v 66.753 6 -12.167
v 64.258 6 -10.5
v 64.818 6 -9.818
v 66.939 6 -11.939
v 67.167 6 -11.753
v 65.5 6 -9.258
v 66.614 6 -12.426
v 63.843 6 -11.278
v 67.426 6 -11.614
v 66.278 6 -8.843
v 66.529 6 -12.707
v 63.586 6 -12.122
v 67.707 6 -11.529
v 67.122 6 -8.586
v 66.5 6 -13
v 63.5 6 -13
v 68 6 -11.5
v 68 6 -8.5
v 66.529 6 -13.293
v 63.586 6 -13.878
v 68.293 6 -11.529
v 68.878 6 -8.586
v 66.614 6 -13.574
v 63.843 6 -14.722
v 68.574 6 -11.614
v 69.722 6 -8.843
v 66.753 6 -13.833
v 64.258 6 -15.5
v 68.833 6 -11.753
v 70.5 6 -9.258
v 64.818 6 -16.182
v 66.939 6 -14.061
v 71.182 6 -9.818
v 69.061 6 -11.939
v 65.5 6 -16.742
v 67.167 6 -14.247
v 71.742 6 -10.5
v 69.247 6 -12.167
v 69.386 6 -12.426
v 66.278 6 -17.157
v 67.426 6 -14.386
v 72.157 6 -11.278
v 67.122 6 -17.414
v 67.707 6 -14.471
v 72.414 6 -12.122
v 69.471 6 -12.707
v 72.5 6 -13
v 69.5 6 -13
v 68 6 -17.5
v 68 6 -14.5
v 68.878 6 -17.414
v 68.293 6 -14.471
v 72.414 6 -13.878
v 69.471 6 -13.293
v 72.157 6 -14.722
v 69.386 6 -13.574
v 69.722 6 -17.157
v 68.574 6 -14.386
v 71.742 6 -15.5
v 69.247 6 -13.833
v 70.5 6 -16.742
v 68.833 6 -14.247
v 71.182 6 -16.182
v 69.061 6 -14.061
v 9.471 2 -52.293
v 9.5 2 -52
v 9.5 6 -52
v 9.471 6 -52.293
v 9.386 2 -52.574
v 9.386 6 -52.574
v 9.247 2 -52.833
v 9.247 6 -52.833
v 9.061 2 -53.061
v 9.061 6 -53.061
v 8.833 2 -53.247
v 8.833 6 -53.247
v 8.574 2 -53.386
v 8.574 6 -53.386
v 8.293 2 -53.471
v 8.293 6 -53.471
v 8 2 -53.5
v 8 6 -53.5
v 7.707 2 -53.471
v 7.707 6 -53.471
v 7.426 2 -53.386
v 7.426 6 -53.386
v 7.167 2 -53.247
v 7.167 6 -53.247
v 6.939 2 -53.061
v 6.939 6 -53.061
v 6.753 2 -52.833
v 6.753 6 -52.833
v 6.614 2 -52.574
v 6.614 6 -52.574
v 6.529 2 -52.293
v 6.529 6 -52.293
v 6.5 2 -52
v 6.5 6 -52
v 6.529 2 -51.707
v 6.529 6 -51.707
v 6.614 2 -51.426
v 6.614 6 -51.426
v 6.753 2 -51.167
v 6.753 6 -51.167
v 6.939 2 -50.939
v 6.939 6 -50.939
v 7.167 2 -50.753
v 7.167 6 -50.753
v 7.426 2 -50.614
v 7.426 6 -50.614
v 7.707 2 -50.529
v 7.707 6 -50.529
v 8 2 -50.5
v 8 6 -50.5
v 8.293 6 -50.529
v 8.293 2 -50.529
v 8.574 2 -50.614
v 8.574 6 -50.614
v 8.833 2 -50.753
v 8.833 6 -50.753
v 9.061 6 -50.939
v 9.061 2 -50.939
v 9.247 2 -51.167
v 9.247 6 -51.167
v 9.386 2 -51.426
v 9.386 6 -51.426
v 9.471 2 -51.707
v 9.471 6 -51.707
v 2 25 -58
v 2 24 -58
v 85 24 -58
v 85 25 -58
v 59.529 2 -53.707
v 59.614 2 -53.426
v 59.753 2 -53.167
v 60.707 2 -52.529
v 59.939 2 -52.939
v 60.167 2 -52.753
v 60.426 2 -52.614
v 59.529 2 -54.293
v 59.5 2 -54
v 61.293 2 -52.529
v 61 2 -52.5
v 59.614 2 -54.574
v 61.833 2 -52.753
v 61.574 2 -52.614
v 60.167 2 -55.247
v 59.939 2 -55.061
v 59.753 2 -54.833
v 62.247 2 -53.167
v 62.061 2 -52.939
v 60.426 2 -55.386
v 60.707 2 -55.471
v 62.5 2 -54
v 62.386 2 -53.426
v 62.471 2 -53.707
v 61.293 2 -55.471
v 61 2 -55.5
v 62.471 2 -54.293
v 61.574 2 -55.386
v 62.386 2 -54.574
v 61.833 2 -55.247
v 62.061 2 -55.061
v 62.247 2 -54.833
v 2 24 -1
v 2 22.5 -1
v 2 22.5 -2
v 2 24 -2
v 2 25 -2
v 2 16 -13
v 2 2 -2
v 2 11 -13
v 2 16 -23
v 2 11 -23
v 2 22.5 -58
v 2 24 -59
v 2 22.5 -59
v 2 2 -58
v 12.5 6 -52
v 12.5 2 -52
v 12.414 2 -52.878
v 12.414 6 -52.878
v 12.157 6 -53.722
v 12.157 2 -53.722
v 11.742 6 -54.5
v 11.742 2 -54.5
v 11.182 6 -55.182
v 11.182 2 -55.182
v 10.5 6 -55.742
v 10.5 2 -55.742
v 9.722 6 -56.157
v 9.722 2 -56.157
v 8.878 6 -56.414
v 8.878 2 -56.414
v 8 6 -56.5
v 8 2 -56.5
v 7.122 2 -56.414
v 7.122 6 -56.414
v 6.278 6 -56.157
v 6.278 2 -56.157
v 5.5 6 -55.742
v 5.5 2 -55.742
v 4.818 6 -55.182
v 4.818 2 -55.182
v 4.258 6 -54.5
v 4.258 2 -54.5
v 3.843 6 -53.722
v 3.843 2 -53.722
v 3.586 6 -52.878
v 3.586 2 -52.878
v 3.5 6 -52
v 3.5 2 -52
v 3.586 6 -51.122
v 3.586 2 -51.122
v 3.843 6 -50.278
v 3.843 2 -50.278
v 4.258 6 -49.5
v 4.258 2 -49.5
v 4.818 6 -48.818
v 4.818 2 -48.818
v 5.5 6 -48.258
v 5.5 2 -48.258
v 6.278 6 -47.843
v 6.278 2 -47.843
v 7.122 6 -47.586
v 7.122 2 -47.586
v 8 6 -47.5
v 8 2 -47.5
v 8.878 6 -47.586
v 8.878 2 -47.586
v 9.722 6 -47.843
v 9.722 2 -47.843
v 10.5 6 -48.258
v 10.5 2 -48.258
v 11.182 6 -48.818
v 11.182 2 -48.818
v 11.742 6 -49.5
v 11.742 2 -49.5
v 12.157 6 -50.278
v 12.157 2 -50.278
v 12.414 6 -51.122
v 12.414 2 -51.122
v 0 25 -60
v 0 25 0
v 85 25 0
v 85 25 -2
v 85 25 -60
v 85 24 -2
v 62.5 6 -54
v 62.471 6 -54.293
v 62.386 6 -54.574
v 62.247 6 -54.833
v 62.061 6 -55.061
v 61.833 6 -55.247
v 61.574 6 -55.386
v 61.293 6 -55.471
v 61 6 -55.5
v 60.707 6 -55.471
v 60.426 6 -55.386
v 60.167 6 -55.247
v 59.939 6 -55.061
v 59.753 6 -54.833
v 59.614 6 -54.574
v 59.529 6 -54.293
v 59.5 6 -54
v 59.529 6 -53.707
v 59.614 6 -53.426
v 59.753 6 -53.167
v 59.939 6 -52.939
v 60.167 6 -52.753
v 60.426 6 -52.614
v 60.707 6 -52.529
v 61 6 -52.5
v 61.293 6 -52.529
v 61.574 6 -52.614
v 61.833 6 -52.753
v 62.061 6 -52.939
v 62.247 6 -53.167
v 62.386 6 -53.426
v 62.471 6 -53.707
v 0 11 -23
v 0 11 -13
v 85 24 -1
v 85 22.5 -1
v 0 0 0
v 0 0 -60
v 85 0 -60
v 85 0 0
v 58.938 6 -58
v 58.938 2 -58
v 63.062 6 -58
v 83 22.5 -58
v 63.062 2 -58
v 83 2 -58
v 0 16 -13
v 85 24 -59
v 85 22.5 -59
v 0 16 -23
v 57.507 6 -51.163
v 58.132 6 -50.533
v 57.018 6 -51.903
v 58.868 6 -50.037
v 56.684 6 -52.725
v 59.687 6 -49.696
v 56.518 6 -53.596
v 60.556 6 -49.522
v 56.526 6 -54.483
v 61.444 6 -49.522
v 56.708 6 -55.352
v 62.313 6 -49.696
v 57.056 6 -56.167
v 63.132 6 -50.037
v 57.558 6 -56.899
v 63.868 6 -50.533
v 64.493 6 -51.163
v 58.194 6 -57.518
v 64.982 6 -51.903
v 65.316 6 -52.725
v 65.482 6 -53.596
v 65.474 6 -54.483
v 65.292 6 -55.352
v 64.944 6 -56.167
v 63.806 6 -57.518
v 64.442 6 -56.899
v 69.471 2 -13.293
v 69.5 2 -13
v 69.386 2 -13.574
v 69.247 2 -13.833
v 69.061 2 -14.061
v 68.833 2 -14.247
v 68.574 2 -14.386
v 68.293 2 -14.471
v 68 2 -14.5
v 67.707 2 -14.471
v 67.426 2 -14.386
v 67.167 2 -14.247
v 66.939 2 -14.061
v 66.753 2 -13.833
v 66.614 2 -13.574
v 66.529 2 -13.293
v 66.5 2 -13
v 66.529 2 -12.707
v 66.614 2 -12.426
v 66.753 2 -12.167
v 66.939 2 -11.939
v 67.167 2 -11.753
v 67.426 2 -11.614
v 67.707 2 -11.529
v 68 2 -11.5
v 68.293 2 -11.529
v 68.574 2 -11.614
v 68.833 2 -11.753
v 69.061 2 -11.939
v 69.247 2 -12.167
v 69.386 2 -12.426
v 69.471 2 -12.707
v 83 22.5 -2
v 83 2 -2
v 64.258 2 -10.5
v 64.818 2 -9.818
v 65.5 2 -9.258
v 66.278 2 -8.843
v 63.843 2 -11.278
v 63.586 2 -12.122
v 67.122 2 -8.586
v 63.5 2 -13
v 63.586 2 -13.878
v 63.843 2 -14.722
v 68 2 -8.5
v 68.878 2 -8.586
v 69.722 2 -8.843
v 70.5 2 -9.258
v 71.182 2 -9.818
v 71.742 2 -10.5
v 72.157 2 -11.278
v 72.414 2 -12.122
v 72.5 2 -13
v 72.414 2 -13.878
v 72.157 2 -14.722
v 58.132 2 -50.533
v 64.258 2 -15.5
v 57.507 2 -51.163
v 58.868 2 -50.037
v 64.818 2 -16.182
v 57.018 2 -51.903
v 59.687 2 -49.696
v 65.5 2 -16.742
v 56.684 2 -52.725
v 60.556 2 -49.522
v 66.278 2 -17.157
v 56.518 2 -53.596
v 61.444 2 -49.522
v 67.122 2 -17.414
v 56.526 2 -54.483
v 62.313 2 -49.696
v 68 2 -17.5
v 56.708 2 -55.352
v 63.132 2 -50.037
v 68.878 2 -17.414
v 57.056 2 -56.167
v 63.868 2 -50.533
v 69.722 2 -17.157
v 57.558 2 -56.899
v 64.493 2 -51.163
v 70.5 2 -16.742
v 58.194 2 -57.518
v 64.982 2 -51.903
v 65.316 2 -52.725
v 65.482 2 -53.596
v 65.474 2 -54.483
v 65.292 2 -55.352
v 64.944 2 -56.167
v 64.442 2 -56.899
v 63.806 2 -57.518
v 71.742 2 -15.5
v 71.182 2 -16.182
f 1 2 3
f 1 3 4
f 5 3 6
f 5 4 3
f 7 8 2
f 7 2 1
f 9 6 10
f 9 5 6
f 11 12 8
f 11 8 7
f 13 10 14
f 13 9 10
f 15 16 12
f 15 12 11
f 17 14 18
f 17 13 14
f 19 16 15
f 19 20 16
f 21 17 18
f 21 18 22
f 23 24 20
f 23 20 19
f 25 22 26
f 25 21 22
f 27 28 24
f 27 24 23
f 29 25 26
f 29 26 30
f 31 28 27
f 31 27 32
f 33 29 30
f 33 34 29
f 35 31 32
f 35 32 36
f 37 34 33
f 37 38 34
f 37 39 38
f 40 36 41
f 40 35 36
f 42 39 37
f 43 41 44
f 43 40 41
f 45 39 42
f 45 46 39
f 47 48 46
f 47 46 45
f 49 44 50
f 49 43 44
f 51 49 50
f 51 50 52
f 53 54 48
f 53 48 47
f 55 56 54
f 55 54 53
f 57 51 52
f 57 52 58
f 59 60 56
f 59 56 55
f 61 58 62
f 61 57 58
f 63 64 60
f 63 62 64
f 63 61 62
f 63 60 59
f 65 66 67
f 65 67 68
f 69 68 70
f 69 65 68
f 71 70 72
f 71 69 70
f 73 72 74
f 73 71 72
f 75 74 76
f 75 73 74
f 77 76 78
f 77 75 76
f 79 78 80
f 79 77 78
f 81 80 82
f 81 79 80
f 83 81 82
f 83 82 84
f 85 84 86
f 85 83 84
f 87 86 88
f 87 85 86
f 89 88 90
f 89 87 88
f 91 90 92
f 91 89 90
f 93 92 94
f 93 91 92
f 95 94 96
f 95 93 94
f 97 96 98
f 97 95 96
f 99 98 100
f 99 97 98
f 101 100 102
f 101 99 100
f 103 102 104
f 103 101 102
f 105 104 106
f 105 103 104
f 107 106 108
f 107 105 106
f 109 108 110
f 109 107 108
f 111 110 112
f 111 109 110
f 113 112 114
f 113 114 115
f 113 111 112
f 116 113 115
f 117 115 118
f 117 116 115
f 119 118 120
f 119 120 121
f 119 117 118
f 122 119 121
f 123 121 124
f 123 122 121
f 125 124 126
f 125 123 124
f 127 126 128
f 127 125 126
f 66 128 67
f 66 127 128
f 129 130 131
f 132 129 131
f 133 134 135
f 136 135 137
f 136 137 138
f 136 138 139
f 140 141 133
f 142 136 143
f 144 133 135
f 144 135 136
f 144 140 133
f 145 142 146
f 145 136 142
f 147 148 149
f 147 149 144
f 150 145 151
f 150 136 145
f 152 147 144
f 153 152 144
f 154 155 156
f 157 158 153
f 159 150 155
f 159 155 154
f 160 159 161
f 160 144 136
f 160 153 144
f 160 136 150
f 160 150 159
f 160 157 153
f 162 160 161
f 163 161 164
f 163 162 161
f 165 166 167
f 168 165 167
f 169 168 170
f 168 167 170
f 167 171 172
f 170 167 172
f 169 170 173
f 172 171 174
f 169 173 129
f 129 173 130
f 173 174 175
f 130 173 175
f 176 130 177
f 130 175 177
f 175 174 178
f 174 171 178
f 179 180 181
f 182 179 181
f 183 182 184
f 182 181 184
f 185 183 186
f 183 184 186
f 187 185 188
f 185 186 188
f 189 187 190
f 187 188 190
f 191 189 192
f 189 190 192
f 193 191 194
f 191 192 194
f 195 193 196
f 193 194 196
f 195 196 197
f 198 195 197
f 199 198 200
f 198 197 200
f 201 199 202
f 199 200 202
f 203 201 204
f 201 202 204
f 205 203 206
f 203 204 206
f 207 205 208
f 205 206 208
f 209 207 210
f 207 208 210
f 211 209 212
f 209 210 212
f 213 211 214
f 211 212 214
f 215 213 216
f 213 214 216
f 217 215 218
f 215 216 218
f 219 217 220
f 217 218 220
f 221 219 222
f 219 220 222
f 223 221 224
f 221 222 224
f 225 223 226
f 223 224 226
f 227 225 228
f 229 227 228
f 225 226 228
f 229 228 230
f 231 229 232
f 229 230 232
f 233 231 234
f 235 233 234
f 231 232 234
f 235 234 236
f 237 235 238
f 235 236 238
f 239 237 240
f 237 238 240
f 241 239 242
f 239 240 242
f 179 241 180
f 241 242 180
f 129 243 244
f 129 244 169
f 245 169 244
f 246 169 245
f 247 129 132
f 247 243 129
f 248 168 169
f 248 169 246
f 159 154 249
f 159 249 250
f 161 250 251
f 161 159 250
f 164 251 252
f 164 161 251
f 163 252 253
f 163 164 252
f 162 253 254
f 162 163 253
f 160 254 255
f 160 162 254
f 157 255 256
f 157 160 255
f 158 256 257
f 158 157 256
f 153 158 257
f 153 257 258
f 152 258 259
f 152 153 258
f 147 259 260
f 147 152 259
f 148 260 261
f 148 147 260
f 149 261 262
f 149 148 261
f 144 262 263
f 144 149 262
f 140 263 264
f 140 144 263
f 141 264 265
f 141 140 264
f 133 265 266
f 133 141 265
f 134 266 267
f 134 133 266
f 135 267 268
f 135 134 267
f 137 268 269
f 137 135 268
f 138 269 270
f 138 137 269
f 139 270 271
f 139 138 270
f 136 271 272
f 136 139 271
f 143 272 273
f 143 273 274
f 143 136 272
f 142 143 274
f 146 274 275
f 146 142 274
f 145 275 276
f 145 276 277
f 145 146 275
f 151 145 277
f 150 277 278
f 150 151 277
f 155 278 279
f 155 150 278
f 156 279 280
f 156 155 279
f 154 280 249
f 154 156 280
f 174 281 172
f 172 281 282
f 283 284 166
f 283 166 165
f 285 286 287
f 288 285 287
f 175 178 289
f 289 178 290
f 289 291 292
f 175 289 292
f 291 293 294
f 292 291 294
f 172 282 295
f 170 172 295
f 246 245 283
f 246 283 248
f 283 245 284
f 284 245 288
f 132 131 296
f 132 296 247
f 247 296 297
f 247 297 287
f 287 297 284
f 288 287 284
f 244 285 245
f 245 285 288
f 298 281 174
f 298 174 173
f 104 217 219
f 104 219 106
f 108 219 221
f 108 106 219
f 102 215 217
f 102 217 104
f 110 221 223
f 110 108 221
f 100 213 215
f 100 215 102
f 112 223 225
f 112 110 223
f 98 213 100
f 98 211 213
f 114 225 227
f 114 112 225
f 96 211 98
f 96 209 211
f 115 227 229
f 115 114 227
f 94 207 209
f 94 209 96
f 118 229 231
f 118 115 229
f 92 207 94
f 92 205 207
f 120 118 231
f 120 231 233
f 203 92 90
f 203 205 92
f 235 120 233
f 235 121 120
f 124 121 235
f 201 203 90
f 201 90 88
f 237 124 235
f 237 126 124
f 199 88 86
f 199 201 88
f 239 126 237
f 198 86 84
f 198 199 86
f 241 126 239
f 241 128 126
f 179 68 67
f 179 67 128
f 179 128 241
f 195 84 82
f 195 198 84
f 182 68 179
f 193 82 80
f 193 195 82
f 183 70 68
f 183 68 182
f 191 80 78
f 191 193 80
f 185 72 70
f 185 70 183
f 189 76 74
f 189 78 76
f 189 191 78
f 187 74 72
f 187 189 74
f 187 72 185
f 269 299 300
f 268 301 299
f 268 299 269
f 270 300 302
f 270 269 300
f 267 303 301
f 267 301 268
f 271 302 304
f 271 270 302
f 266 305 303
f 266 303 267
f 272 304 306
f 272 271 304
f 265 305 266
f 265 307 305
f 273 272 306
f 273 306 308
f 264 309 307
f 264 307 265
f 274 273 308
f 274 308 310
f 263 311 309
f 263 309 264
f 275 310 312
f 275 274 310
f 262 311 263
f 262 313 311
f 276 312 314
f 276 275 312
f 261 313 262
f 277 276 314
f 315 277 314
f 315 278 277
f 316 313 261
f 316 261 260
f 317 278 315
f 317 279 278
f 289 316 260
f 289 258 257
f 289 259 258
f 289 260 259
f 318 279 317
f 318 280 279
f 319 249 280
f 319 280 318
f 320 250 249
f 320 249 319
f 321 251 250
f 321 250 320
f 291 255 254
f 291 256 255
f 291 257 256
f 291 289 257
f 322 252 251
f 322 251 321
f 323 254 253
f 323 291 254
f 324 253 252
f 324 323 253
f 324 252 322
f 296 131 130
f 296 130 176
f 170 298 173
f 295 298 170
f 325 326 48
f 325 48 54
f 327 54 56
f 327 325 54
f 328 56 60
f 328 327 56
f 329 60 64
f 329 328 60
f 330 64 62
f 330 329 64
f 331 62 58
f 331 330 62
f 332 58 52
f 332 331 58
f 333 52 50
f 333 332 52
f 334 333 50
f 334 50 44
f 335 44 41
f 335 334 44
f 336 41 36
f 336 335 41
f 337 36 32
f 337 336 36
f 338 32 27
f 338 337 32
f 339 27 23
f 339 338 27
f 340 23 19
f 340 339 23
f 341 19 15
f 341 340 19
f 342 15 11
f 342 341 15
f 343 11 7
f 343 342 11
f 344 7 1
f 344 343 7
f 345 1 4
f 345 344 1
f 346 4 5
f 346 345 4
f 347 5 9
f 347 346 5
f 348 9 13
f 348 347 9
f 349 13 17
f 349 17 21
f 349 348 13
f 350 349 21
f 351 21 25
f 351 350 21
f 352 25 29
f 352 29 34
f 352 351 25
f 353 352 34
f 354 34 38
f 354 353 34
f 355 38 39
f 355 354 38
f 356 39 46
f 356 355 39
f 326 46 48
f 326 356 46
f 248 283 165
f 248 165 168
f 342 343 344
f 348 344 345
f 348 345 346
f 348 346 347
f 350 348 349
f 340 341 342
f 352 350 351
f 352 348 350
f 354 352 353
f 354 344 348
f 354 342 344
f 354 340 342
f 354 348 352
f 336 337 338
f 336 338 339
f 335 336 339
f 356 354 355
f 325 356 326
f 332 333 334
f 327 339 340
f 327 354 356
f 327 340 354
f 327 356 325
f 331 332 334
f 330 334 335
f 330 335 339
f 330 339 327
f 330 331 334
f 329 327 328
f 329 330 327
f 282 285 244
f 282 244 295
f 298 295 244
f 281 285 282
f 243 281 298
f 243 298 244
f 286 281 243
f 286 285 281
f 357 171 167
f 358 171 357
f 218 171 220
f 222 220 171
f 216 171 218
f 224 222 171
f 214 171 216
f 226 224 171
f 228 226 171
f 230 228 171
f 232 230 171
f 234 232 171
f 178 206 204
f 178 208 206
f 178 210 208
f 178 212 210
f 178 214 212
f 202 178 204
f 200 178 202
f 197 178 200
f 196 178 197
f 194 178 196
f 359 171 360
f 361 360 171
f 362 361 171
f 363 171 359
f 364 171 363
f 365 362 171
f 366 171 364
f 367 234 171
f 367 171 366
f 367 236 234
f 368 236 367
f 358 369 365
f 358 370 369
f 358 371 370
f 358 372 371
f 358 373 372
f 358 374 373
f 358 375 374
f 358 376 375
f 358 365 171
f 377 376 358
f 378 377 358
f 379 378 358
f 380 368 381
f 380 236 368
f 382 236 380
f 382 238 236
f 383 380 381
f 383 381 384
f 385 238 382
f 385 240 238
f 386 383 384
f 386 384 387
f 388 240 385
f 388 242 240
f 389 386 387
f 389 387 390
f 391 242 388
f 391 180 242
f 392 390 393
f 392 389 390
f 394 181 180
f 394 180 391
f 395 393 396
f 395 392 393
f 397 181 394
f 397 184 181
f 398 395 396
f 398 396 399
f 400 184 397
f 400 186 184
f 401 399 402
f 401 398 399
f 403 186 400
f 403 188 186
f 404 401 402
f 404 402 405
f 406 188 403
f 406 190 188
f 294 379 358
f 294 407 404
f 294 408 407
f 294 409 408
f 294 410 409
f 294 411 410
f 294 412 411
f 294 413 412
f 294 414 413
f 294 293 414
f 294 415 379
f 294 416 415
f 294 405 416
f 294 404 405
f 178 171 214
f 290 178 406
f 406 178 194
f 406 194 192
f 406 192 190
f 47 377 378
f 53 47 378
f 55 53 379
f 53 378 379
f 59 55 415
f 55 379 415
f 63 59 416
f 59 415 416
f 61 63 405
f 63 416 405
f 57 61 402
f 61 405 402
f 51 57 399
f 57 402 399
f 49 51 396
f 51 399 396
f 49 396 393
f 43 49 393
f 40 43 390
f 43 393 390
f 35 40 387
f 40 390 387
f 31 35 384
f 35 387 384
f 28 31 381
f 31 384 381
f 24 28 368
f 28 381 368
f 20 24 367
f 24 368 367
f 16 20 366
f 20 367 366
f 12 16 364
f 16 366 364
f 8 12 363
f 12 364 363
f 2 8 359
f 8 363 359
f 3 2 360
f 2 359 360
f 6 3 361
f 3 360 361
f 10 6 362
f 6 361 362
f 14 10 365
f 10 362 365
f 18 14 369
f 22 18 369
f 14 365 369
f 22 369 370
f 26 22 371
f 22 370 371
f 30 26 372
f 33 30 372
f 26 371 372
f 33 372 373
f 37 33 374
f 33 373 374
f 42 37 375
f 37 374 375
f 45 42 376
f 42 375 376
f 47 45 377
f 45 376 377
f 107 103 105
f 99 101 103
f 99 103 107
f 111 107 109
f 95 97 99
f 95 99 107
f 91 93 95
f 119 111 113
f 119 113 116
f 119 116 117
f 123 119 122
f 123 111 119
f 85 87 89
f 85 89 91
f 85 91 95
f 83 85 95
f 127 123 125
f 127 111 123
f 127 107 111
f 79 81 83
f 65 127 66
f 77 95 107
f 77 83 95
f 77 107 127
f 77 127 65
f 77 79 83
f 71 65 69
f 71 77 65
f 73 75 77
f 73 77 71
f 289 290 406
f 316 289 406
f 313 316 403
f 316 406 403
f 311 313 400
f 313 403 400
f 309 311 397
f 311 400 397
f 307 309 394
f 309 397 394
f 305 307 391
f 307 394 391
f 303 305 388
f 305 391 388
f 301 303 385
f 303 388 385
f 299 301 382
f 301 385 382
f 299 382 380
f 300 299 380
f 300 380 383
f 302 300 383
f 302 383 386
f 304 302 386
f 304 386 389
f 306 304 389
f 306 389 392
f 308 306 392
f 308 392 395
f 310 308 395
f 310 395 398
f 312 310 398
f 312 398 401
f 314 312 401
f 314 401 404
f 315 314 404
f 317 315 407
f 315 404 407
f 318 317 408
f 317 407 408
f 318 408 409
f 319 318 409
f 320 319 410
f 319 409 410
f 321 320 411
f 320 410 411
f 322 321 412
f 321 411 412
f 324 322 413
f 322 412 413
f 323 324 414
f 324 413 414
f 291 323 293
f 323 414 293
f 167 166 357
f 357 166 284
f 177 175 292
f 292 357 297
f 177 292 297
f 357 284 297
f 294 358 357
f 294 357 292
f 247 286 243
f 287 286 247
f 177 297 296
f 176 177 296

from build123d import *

# Parameters (mm, degrees)
SKIZZE1_W                       = 85
SKIZZE1_H                       = 60
AUFSATZ_LINEAR_AUSTRAGEN1_DEPTH = 25
WANDUNG1_T                      = -2
SKIZZE2_R                       = 4.5
SKIZZE2_R_2                     = 1.5
AUFSATZ_LINEAR_AUSTRAGEN2_DEPTH = 4
SCHNITT_LINEAR_AUSTRAGEN1_REACH = 87
SKIZZE3_W                       = 10
SKIZZE3_H                       = 5
SCHNITT_LINEAR_AUSTRAGEN2_REACH = 87
SKIZZE4_W                       = 56
SKIZZE4_H                       = 1
SKIZZE5_W                       = 58
SKIZZE5_H                       = 1.5
SCHNITT_LINEAR_AUSTRAGEN3_DEPTH = 83


with BuildPart() as part:
    # Skizze1 → Aufsatz-Linear austragen1 (new body)
    with BuildSketch(Plane(origin=(0, 0, 0), x_dir=(1, 0, 0), z_dir=(0, 1, 0))):
        with Locations((42.5, 30)):
            Rectangle(SKIZZE1_W, SKIZZE1_H)
    extrude(amount=AUFSATZ_LINEAR_AUSTRAGEN1_DEPTH)

    # Wandung1
    wandung1_openings = [part.faces().sort_by_distance(p)[0] for p in [
        (42.5, 25, -30),
    ]]
    offset(amount=WANDUNG1_T, openings=wandung1_openings, kind=Kind.INTERSECTION)

    # Skizze2 → Aufsatz-Linear austragen2 (add)
    with BuildSketch(Plane(origin=(0, 2, 0), x_dir=(1, 0, 0), z_dir=(0, 1, 0))):
        with Locations((8, 52)):
            Circle(SKIZZE2_R)
        with Locations((8, 52)):
            Circle(SKIZZE2_R_2, mode=Mode.SUBTRACT)
        with Locations((61, 54)):
            Circle(SKIZZE2_R)
        with Locations((61, 54)):
            Circle(SKIZZE2_R_2, mode=Mode.SUBTRACT)
        with Locations((68, 13)):
            Circle(SKIZZE2_R)
        with Locations((68, 13)):
            Circle(SKIZZE2_R_2, mode=Mode.SUBTRACT)
    extrude(amount=AUFSATZ_LINEAR_AUSTRAGEN2_DEPTH)

    # Skizze3 → Schnitt-Linear austragen1 (cut, up to next)
    with BuildSketch(Plane.ZY, mode=Mode.PRIVATE) as schnitt_linear_austragen1_sk1:
        with Locations((-18, 13.5)):
            Rectangle(SKIZZE3_W, SKIZZE3_H)
    schnitt_linear_austragen1_tool1 = extrude(schnitt_linear_austragen1_sk1.sketch, amount=-SCHNITT_LINEAR_AUSTRAGEN1_REACH, mode=Mode.PRIVATE) & part.part
    add(schnitt_linear_austragen1_tool1.solids().sort_by_distance((0, 13.5, -18))[0], mode=Mode.SUBTRACT)

    # Skizze4 → Schnitt-Linear austragen2 (cut, up to next)
    with BuildSketch(Plane(origin=(85, 0, 0), x_dir=(0, 0, -1), z_dir=(1, 0, 0)), mode=Mode.PRIVATE) as schnitt_linear_austragen2_sk1:
        with Locations((30, 24.5)):
            Rectangle(SKIZZE4_W, SKIZZE4_H)
    schnitt_linear_austragen2_tool1 = extrude(schnitt_linear_austragen2_sk1.sketch, amount=-SCHNITT_LINEAR_AUSTRAGEN2_REACH, mode=Mode.PRIVATE) & part.part
    add(schnitt_linear_austragen2_tool1.solids().sort_by_distance((85, 24.5, -30))[0], mode=Mode.SUBTRACT)

    # Skizze5 → Schnitt-Linear austragen3 (cut)
    with BuildSketch(Plane(origin=(85, 0, 0), x_dir=(0, 0, -1), z_dir=(1, 0, 0))):
        with Locations((30, 23.25)):
            Rectangle(SKIZZE5_W, SKIZZE5_H)
    extrude(amount=-SCHNITT_LINEAR_AUSTRAGEN3_DEPTH, mode=Mode.SUBTRACT)


solid = part.part
